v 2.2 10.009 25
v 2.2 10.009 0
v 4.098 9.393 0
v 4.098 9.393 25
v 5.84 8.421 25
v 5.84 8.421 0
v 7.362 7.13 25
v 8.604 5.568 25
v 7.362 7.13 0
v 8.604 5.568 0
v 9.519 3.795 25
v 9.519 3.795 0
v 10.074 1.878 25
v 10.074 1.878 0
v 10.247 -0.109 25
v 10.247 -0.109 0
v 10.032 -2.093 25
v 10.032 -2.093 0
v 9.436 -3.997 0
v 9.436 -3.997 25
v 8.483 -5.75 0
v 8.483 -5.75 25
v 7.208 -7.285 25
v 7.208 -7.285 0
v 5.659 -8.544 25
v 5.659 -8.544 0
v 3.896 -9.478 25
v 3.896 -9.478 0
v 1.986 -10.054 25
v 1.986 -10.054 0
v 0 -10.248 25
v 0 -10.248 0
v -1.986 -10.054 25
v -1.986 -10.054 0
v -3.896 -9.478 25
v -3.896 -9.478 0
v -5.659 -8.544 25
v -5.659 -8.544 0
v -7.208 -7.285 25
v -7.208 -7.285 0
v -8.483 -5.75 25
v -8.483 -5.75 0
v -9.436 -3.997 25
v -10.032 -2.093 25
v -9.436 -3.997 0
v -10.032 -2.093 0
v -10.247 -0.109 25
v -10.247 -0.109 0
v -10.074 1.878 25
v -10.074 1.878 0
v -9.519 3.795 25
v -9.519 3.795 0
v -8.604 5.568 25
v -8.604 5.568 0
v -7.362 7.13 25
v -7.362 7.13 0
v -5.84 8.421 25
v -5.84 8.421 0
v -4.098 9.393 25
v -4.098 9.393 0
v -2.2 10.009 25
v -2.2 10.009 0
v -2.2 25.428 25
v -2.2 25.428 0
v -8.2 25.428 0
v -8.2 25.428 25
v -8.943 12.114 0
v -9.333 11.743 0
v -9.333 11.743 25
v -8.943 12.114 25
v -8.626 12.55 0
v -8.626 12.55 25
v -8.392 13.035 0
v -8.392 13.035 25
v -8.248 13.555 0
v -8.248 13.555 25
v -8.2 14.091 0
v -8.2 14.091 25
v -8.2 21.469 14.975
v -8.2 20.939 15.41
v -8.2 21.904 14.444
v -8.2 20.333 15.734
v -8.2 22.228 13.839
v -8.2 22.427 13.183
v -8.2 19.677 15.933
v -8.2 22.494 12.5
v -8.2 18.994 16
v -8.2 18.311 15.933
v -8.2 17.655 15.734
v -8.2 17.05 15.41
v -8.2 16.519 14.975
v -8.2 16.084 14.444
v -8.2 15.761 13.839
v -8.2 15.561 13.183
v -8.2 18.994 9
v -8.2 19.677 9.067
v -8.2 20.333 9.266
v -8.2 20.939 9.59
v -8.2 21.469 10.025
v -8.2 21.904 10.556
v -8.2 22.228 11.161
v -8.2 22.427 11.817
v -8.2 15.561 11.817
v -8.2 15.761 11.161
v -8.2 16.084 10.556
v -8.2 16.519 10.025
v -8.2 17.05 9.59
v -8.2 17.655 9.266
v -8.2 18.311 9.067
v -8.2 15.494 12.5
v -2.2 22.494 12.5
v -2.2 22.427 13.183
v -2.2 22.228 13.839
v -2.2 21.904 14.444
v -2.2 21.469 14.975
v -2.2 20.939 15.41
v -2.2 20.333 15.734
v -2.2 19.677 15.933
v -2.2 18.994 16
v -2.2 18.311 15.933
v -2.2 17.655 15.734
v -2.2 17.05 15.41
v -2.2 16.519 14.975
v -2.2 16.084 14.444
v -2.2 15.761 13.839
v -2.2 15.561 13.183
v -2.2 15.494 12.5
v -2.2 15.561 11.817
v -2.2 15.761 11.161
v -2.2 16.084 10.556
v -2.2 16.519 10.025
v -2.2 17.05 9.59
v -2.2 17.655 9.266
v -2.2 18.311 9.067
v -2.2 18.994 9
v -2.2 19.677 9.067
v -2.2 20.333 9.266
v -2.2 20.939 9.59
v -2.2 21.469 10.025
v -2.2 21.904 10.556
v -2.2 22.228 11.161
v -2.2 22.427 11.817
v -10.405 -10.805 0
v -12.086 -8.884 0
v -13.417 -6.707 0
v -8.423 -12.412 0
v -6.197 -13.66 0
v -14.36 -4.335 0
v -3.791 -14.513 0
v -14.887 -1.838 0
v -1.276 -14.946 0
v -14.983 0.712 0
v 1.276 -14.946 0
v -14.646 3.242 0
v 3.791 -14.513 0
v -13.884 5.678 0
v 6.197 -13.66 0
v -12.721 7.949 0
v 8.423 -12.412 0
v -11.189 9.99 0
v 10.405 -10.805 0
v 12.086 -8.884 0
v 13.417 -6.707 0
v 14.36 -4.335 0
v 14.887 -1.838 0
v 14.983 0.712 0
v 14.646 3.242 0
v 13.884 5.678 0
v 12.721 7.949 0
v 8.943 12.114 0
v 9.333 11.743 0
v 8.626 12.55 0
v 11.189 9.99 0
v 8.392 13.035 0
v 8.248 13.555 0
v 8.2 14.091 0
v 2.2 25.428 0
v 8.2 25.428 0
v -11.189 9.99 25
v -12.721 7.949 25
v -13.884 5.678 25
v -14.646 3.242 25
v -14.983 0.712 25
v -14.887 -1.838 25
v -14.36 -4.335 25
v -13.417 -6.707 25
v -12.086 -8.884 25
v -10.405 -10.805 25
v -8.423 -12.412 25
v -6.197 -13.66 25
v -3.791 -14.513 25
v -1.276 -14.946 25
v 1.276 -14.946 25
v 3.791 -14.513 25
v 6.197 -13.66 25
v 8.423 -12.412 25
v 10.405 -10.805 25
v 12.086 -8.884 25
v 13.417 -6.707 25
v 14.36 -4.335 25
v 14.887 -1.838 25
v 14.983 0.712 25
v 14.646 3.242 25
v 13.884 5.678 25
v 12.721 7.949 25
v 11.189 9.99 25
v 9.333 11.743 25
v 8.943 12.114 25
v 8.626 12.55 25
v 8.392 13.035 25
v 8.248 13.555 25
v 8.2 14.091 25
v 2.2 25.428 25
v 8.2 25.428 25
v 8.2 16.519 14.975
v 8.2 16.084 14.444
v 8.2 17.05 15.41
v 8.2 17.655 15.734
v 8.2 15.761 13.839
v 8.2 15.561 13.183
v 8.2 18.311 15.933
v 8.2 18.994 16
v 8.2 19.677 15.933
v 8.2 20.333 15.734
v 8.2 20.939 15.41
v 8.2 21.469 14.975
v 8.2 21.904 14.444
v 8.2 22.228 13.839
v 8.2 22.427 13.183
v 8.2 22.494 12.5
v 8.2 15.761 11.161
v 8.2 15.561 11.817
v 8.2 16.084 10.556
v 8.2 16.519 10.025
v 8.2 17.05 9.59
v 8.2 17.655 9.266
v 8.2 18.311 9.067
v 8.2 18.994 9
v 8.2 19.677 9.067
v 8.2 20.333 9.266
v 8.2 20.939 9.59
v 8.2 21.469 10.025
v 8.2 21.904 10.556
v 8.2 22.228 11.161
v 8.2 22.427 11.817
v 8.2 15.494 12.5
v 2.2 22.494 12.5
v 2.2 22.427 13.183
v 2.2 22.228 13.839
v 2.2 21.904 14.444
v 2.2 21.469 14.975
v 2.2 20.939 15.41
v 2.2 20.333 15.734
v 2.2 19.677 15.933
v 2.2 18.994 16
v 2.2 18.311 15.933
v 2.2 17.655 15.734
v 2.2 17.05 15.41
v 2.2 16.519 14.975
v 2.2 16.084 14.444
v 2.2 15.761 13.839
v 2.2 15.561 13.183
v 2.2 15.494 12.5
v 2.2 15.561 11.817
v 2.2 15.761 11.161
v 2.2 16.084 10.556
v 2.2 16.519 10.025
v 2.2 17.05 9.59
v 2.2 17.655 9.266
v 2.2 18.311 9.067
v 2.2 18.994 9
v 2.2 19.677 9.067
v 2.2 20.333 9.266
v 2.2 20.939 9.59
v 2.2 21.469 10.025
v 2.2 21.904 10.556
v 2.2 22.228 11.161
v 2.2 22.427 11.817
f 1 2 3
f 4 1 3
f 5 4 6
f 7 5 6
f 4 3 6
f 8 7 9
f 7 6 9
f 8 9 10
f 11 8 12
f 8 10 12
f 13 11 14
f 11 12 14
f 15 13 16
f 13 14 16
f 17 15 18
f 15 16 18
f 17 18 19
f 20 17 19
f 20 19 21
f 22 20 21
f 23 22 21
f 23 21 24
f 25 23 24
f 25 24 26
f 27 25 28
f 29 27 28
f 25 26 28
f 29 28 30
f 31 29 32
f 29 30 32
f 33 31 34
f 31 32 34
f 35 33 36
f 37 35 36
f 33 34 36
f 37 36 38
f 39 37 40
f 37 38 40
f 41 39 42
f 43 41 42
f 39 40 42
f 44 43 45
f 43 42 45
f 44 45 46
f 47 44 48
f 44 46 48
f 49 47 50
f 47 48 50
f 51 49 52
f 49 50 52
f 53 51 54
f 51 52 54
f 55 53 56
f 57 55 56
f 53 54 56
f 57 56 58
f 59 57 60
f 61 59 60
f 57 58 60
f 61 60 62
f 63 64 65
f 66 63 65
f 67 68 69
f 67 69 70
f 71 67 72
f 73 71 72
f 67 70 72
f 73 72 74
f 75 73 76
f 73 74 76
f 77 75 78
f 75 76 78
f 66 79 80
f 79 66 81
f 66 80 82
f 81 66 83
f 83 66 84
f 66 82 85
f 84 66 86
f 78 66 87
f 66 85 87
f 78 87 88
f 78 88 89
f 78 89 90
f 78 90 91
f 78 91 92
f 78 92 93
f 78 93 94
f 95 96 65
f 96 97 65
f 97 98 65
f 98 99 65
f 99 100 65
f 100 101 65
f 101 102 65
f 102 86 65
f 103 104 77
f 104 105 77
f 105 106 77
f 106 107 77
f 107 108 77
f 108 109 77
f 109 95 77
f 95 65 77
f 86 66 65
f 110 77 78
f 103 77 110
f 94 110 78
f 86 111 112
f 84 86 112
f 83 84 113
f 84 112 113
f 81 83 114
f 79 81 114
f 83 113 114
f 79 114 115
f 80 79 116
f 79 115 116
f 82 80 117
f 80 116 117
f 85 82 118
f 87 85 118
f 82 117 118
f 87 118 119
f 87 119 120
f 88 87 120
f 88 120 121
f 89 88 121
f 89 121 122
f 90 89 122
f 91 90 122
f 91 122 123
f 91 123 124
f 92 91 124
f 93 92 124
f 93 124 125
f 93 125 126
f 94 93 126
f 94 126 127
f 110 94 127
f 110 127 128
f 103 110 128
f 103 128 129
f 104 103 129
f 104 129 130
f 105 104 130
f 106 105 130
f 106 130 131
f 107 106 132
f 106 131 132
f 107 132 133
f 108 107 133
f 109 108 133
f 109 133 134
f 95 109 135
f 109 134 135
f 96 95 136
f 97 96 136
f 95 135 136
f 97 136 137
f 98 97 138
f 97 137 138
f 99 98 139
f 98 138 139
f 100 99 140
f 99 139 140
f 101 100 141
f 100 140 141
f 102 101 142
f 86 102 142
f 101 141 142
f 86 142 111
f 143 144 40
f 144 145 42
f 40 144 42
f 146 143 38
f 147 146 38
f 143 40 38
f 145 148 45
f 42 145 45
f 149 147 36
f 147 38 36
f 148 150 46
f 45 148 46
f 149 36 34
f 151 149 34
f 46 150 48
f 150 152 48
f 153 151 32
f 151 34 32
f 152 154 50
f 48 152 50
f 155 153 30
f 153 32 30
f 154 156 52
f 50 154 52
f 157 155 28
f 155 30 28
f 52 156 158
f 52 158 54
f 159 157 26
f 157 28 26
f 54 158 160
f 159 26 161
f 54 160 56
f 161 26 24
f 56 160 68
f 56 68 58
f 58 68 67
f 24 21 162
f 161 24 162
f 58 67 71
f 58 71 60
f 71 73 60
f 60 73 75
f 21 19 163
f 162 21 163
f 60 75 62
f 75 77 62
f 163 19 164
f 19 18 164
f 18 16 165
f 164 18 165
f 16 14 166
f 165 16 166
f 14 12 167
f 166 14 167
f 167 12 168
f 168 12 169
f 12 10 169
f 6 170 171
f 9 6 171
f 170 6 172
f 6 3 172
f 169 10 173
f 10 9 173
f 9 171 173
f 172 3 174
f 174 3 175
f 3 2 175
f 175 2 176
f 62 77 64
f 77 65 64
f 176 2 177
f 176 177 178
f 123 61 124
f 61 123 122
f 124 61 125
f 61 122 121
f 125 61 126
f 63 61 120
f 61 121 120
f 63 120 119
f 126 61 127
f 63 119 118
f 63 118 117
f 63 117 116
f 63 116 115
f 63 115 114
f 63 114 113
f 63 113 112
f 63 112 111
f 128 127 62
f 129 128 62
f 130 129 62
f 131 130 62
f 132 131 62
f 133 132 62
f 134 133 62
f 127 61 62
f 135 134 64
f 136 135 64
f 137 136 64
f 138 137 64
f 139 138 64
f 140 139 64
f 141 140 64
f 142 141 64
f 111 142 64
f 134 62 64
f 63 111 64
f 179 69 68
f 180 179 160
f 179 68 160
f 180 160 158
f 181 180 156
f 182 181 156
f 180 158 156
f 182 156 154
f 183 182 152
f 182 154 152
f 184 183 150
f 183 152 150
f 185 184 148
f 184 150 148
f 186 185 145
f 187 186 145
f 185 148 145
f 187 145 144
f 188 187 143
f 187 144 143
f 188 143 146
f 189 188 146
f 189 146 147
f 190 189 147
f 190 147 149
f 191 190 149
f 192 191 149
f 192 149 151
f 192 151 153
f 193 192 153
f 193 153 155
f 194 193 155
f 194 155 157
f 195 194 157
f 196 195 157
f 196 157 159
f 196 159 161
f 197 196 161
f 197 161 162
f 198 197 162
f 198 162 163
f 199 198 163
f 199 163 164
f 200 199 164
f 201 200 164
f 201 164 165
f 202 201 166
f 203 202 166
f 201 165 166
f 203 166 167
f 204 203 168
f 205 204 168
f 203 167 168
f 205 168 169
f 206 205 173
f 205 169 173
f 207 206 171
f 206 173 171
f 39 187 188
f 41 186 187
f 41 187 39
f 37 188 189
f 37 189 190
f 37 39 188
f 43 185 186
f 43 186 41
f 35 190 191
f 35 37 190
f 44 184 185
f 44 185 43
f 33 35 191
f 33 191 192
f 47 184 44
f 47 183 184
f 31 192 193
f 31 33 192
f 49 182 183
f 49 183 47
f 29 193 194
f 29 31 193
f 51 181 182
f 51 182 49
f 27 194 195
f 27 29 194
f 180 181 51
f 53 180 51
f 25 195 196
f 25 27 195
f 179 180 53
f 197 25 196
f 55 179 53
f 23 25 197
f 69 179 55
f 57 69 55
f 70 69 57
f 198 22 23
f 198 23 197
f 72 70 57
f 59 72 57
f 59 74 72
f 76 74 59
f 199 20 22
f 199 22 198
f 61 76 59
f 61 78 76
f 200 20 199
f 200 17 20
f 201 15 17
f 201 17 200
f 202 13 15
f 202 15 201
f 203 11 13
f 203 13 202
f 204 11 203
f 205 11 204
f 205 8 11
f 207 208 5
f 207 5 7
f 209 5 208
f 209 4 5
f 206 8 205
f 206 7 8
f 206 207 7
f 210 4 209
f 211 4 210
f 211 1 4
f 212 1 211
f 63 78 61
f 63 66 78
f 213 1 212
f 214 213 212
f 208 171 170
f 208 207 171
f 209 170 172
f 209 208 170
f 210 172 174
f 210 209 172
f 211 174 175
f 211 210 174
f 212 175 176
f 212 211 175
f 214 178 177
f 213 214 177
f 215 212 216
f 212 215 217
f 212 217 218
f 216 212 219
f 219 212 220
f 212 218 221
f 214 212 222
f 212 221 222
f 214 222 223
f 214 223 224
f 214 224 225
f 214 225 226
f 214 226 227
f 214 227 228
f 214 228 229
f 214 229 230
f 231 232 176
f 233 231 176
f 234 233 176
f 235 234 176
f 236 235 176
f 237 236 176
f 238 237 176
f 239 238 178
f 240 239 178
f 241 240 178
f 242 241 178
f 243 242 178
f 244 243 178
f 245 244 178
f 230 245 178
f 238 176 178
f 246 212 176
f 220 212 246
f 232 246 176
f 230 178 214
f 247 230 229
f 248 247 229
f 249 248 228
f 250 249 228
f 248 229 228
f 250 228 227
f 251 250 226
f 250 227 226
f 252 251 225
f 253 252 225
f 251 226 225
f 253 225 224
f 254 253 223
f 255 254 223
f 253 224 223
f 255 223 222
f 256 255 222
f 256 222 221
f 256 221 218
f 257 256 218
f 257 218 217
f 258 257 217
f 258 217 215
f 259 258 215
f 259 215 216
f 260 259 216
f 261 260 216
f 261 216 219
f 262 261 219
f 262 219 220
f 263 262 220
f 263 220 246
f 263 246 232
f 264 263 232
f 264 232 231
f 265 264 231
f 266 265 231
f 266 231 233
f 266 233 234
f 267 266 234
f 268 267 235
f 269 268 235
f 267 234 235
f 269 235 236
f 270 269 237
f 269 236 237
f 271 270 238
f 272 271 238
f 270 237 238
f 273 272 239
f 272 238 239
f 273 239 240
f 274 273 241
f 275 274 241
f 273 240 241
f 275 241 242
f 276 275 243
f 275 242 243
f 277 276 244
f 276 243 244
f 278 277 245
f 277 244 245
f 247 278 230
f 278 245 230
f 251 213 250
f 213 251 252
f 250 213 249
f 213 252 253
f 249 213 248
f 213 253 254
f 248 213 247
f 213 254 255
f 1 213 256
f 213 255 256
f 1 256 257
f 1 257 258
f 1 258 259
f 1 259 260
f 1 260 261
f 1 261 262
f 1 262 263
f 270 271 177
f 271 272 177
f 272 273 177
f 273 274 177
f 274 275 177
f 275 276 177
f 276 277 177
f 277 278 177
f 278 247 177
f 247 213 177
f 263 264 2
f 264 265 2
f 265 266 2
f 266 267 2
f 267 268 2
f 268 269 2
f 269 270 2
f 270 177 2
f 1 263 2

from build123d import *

# Parameters (mm, degrees)
F1_DEPTH = 25
F2_R     = 3.5
F3_DEPTH = 25
F4_R     = 3


with BuildPart() as f1:
    # F0 (on Top) → F1 (new body)
    with BuildSketch(Plane.XY):
        with BuildLine():
            ThreePointArc((-8.2, 12.5602547745), (-7.1414284285, -13.1909059583), (15, 0))
            ThreePointArc((15, 0), (13.1909059583, 7.1414284285), (8.2, 12.5602547745))
            ThreePointArc((8.2, 12.5602547745), (5.3232312755, 14.0236660253), (2.2, 14.8377895928))
            Line((2.2, 14.8377895928), (2.2, 10.0091561408))
            ThreePointArc((2.2, 10.0091561408), (7.9865195614, 6.4217374554), (10.248083072, 0))
            ThreePointArc((10.248083072, 0), (-6.4217374554, -7.9865195614), (-2.2, 10.0091561408))
            Line((-2.2, 10.0091561408), (-2.2, 14.8377895928))
            ThreePointArc((-2.2, 14.8377895928), (-5.3232312755, 14.0236660253), (-8.2, 12.5602547745))
        make_face()
        with BuildLine():
            Line((-8.2, 25.4279577023), (-8.2, 12.5602547745))
            ThreePointArc((-8.2, 12.5602547745), (-5.3232312755, 14.0236660253), (-2.2, 14.8377895928))
            Line((-2.2, 14.8377895928), (-2.2, 25.4279577023))
            Line((-2.2, 25.4279577023), (-8.2, 25.4279577023))
        make_face()
        with BuildLine():
            ThreePointArc((2.2, 14.8377895928), (5.3232312755, 14.0236660253), (8.2, 12.5602547745))
            Line((8.2, 12.5602547745), (8.2, 25.4279577023))
            Line((8.2, 25.4279577023), (2.2, 25.4279577023))
            Line((2.2, 25.4279577023), (2.2, 14.8377895928))
        make_face()
    extrude(amount=F1_DEPTH)

    # F2 (on face) → F3 (cut)
    with BuildSketch(Plane.YZ.offset(8.2)):
        with Locations((18.9941062384, 12.5)):
            Circle(F2_R)
    extrude(amount=-F3_DEPTH, mode=Mode.SUBTRACT)

    # F4
    f4_edges = [f1.edges().sort_by_distance(p)[0] for p in [
        (8.2, 12.560255, 12.5),
        (-8.2, 12.560255, 12.5),
    ]]
    fillet(f4_edges, radius=F4_R)


solid = f1.part
